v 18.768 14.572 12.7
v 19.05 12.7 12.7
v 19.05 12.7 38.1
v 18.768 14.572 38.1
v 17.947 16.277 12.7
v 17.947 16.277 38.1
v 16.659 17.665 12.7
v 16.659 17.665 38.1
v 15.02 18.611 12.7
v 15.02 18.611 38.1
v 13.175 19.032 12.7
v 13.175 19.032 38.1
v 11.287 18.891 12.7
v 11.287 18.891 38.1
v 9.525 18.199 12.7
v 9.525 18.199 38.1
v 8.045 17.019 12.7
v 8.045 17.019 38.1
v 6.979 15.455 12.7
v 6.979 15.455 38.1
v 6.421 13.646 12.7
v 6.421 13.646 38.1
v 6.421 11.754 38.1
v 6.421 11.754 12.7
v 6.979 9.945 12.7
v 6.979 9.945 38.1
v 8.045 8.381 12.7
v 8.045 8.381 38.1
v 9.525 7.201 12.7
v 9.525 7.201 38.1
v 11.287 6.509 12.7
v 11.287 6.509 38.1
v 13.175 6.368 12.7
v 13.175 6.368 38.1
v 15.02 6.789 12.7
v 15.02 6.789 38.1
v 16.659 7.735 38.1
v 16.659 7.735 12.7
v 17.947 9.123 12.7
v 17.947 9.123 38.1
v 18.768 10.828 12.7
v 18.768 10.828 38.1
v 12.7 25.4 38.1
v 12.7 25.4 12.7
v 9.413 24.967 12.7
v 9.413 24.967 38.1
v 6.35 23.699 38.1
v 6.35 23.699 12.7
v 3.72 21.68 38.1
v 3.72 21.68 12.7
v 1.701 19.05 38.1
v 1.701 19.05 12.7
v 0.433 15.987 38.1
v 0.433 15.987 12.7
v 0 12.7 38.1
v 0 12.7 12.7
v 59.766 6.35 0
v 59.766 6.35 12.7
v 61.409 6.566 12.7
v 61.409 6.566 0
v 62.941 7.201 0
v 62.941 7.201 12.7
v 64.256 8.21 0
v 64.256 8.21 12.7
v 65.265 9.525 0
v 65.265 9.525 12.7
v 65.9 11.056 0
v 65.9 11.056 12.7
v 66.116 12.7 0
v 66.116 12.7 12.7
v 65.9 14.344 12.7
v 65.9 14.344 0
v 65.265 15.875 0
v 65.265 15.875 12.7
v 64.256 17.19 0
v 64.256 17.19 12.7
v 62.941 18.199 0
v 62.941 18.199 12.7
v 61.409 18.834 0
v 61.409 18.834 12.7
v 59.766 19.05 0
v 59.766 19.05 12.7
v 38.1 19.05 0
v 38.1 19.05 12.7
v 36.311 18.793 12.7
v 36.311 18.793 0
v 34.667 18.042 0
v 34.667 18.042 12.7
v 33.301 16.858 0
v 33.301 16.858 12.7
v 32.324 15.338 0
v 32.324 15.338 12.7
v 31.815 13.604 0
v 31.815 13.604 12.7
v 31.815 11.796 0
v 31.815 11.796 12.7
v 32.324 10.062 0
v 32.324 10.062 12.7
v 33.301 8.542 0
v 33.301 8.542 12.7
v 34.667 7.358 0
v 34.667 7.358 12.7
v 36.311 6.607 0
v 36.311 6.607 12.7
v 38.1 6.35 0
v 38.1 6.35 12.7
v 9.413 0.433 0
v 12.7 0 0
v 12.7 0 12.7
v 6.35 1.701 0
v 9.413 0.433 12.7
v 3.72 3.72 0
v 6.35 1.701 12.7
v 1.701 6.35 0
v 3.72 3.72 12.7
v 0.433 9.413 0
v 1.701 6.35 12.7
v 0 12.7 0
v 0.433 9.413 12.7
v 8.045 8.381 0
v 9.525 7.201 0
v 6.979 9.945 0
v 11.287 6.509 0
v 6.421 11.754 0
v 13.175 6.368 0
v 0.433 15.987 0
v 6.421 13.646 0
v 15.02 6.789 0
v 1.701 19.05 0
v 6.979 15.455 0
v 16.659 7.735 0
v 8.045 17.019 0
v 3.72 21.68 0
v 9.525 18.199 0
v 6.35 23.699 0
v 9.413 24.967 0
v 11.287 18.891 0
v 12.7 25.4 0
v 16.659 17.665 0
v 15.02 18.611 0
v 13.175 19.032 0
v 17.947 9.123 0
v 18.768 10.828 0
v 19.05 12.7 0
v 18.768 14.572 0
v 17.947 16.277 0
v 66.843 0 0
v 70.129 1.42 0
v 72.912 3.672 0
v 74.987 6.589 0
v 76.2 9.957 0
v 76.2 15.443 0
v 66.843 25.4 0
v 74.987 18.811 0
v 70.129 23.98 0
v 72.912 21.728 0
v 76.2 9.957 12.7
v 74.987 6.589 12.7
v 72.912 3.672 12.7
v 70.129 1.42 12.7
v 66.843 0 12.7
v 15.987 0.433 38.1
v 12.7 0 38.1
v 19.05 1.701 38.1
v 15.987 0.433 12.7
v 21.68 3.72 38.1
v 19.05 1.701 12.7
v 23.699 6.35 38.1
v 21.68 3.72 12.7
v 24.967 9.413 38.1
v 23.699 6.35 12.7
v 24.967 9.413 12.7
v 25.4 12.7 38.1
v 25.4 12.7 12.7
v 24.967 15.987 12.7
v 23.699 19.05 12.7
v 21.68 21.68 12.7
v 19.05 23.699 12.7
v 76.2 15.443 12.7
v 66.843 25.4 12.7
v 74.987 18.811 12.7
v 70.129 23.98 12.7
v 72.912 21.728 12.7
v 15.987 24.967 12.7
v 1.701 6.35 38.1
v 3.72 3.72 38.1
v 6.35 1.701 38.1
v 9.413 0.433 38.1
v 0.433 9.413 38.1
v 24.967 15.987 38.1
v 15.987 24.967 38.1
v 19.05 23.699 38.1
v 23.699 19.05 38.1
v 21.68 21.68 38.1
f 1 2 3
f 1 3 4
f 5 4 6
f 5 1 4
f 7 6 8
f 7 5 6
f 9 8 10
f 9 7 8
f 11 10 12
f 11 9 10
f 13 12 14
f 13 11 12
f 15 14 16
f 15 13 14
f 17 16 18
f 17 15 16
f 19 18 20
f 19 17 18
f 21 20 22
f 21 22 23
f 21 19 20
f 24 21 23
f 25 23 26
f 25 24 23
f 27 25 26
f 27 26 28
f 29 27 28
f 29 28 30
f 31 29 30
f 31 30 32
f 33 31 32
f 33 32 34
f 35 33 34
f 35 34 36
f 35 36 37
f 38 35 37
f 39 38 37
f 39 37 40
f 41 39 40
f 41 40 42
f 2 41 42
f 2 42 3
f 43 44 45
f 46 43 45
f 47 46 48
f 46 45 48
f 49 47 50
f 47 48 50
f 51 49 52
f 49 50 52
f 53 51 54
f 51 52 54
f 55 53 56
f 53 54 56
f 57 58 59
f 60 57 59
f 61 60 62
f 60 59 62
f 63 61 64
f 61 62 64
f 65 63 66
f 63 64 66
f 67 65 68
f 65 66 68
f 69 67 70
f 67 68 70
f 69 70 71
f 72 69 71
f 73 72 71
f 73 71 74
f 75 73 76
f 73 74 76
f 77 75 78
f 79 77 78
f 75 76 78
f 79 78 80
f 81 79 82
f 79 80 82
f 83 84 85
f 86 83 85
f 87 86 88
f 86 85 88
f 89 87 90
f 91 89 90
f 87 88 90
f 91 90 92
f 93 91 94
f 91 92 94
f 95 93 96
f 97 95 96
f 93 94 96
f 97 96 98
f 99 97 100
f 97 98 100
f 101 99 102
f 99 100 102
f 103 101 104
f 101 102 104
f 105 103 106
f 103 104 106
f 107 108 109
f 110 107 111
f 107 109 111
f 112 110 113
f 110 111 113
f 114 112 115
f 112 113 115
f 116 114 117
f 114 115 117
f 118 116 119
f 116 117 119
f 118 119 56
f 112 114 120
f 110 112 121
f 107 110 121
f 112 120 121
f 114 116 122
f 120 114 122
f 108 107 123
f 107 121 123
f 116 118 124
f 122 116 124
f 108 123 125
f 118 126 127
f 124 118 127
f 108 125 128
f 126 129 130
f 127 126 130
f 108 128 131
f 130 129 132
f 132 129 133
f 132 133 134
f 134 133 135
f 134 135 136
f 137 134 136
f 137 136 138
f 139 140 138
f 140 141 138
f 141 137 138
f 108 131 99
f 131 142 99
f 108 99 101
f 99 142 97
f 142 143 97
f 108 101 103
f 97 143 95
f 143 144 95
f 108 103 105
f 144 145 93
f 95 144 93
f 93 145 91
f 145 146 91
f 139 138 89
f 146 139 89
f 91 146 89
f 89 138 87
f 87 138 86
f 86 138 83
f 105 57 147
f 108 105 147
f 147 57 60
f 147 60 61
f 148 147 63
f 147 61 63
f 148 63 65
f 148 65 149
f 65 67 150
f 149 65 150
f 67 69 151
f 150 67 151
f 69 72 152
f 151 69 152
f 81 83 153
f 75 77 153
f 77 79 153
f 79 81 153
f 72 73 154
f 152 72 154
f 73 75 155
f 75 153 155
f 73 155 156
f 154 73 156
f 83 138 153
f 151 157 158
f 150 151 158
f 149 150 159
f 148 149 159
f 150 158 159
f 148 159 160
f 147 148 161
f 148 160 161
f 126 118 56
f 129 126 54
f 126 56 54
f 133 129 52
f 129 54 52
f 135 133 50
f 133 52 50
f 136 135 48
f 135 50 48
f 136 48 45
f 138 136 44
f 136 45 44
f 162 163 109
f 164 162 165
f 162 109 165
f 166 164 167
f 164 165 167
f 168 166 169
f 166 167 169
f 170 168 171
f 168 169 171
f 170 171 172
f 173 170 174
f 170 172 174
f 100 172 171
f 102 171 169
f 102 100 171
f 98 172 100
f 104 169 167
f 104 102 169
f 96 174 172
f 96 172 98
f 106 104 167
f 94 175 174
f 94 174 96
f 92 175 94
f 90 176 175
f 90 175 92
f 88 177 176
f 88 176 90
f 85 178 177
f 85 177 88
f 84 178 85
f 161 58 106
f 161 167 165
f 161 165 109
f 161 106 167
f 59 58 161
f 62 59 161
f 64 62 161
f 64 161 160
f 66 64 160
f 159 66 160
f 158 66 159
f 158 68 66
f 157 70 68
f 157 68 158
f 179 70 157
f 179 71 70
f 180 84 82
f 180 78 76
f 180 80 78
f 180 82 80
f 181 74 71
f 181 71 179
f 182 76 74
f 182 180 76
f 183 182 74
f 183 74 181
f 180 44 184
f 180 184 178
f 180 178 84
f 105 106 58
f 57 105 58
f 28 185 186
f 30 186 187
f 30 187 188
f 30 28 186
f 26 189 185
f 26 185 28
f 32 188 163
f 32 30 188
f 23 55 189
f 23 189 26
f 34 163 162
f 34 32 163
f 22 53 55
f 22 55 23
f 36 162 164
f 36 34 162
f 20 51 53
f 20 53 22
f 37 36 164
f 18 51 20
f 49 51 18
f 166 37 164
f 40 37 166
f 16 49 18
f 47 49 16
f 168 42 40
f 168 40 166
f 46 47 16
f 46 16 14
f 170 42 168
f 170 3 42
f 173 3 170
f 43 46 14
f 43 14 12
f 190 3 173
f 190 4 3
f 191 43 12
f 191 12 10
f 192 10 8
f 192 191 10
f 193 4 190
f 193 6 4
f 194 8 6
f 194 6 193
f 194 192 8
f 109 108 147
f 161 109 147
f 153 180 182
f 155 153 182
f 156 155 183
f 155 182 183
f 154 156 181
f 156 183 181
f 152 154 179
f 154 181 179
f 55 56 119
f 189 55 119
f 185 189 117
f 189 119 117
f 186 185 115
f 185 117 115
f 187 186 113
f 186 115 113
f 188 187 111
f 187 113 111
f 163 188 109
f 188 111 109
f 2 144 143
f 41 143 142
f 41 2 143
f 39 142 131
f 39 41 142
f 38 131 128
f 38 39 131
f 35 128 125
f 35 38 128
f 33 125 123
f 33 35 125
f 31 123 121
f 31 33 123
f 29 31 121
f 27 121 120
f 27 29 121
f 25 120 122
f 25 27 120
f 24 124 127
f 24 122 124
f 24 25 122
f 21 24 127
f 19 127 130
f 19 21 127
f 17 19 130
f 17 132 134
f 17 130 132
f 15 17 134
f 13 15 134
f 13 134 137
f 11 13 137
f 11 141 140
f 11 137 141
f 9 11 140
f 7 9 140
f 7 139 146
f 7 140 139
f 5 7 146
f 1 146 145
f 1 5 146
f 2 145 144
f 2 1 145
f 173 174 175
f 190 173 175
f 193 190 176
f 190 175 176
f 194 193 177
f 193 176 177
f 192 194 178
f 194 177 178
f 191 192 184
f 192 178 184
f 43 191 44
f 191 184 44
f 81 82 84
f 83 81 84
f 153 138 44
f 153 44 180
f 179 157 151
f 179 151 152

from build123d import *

# Parameters (mm, degrees)
F0_R     = 6.35
F1_DEPTH = 38.1
F2_W     = 76.2
F2_H     = 25.4
F3_DEPTH = 12.7
F4_DEPTH = 76.2
F6_DEPTH = 12.7


with BuildPart() as f1:
    # F0 (on Top) → F1 (new body)
    with BuildSketch(Plane.XY):
        with BuildLine():
            ThreePointArc((25.4, 12.7), (21.6802561211, 21.6802561211), (12.7, 25.4))
            ThreePointArc((12.7, 25.4), (3.7197438789, 21.6802561211), (0, 12.7))
            ThreePointArc((0, 12.7), (3.7197438961, 3.7197438617), (12.7000000487, 0))
            ThreePointArc((12.7000000487, 0), (21.6802561383, 3.7197438961), (25.4, 12.7))
        make_face()
        with Locations((12.7, 12.7)):
            Circle(F0_R, mode=Mode.SUBTRACT)
    extrude(amount=F1_DEPTH)

    # F2 (on Top) → F3 (join)
    with BuildSketch(Plane.XY):
        with Locations((38.1, 12.7)):
            Rectangle(F2_W, F2_H)
    extrude(amount=F3_DEPTH)

    # F4 (cut): faces of the model
    f4_faces = [f1.faces().sort_by_distance(p)[0] for p in [
        (2.8367728246, 22.5632271754, 12.7),
        (2.8367728246, 2.8367728246, 12.7),
        (12.7, 12.7, 12.7),
    ]]
    extrude(f4_faces, amount=-F4_DEPTH, mode=Mode.SUBTRACT)

    # F5 (on face) → F6 (cut)
    with BuildSketch(Plane.XY.offset(12.7)):
        with BuildLine():
            ThreePointArc((38.1, 19.05), (42.5901280605, 17.1901280605), (44.45, 12.7))
            ThreePointArc((44.45, 12.7), (42.5901280605, 8.2098719395), (38.1, 6.35))
            Line((38.1, 6.35), (59.7659657613, 6.35))
            ThreePointArc((59.7659657613, 6.35), (53.4159657613, 12.7), (59.7659657613, 19.05))
            Line((59.7659657613, 19.05), (38.1, 19.05))
        make_face()
        with BuildLine():
            ThreePointArc((38.1, 6.35), (42.5901280605, 8.2098719395), (44.45, 12.7))
            ThreePointArc((44.45, 12.7), (42.5901280605, 17.1901280605), (38.1, 19.05))
            ThreePointArc((38.1, 19.05), (31.75, 12.7), (38.1, 6.35))
        make_face()
        with BuildLine():
            ThreePointArc((66.1159657613, 12.7), (64.2560938218, 17.1901280605), (59.7659657613, 19.05))
            ThreePointArc((59.7659657613, 19.05), (53.4159657613, 12.7), (59.7659657613, 6.35))
            ThreePointArc((59.7659657613, 6.35), (64.2560938218, 8.2098719395), (66.1159657613, 12.7))
        make_face()
        with BuildLine():
            ThreePointArc((66.8432824171, 25.4), (72.9122904211, 21.7280036784), (76.2, 15.4425139708))
            Line((76.2, 15.4425139708), (76.2, 25.4))
            Line((76.2, 25.4), (66.8432824171, 25.4))
        make_face()
        with BuildLine():
            ThreePointArc((76.2, 9.9574860292), (72.9122904211, 3.6719963216), (66.8432824171, 0))
            Line((66.8432824171, 0), (76.2, 0))
            Line((76.2, 0), (76.2, 9.9574860292))
        make_face()
    extrude(amount=-F6_DEPTH, mode=Mode.SUBTRACT)


solid = f1.part
